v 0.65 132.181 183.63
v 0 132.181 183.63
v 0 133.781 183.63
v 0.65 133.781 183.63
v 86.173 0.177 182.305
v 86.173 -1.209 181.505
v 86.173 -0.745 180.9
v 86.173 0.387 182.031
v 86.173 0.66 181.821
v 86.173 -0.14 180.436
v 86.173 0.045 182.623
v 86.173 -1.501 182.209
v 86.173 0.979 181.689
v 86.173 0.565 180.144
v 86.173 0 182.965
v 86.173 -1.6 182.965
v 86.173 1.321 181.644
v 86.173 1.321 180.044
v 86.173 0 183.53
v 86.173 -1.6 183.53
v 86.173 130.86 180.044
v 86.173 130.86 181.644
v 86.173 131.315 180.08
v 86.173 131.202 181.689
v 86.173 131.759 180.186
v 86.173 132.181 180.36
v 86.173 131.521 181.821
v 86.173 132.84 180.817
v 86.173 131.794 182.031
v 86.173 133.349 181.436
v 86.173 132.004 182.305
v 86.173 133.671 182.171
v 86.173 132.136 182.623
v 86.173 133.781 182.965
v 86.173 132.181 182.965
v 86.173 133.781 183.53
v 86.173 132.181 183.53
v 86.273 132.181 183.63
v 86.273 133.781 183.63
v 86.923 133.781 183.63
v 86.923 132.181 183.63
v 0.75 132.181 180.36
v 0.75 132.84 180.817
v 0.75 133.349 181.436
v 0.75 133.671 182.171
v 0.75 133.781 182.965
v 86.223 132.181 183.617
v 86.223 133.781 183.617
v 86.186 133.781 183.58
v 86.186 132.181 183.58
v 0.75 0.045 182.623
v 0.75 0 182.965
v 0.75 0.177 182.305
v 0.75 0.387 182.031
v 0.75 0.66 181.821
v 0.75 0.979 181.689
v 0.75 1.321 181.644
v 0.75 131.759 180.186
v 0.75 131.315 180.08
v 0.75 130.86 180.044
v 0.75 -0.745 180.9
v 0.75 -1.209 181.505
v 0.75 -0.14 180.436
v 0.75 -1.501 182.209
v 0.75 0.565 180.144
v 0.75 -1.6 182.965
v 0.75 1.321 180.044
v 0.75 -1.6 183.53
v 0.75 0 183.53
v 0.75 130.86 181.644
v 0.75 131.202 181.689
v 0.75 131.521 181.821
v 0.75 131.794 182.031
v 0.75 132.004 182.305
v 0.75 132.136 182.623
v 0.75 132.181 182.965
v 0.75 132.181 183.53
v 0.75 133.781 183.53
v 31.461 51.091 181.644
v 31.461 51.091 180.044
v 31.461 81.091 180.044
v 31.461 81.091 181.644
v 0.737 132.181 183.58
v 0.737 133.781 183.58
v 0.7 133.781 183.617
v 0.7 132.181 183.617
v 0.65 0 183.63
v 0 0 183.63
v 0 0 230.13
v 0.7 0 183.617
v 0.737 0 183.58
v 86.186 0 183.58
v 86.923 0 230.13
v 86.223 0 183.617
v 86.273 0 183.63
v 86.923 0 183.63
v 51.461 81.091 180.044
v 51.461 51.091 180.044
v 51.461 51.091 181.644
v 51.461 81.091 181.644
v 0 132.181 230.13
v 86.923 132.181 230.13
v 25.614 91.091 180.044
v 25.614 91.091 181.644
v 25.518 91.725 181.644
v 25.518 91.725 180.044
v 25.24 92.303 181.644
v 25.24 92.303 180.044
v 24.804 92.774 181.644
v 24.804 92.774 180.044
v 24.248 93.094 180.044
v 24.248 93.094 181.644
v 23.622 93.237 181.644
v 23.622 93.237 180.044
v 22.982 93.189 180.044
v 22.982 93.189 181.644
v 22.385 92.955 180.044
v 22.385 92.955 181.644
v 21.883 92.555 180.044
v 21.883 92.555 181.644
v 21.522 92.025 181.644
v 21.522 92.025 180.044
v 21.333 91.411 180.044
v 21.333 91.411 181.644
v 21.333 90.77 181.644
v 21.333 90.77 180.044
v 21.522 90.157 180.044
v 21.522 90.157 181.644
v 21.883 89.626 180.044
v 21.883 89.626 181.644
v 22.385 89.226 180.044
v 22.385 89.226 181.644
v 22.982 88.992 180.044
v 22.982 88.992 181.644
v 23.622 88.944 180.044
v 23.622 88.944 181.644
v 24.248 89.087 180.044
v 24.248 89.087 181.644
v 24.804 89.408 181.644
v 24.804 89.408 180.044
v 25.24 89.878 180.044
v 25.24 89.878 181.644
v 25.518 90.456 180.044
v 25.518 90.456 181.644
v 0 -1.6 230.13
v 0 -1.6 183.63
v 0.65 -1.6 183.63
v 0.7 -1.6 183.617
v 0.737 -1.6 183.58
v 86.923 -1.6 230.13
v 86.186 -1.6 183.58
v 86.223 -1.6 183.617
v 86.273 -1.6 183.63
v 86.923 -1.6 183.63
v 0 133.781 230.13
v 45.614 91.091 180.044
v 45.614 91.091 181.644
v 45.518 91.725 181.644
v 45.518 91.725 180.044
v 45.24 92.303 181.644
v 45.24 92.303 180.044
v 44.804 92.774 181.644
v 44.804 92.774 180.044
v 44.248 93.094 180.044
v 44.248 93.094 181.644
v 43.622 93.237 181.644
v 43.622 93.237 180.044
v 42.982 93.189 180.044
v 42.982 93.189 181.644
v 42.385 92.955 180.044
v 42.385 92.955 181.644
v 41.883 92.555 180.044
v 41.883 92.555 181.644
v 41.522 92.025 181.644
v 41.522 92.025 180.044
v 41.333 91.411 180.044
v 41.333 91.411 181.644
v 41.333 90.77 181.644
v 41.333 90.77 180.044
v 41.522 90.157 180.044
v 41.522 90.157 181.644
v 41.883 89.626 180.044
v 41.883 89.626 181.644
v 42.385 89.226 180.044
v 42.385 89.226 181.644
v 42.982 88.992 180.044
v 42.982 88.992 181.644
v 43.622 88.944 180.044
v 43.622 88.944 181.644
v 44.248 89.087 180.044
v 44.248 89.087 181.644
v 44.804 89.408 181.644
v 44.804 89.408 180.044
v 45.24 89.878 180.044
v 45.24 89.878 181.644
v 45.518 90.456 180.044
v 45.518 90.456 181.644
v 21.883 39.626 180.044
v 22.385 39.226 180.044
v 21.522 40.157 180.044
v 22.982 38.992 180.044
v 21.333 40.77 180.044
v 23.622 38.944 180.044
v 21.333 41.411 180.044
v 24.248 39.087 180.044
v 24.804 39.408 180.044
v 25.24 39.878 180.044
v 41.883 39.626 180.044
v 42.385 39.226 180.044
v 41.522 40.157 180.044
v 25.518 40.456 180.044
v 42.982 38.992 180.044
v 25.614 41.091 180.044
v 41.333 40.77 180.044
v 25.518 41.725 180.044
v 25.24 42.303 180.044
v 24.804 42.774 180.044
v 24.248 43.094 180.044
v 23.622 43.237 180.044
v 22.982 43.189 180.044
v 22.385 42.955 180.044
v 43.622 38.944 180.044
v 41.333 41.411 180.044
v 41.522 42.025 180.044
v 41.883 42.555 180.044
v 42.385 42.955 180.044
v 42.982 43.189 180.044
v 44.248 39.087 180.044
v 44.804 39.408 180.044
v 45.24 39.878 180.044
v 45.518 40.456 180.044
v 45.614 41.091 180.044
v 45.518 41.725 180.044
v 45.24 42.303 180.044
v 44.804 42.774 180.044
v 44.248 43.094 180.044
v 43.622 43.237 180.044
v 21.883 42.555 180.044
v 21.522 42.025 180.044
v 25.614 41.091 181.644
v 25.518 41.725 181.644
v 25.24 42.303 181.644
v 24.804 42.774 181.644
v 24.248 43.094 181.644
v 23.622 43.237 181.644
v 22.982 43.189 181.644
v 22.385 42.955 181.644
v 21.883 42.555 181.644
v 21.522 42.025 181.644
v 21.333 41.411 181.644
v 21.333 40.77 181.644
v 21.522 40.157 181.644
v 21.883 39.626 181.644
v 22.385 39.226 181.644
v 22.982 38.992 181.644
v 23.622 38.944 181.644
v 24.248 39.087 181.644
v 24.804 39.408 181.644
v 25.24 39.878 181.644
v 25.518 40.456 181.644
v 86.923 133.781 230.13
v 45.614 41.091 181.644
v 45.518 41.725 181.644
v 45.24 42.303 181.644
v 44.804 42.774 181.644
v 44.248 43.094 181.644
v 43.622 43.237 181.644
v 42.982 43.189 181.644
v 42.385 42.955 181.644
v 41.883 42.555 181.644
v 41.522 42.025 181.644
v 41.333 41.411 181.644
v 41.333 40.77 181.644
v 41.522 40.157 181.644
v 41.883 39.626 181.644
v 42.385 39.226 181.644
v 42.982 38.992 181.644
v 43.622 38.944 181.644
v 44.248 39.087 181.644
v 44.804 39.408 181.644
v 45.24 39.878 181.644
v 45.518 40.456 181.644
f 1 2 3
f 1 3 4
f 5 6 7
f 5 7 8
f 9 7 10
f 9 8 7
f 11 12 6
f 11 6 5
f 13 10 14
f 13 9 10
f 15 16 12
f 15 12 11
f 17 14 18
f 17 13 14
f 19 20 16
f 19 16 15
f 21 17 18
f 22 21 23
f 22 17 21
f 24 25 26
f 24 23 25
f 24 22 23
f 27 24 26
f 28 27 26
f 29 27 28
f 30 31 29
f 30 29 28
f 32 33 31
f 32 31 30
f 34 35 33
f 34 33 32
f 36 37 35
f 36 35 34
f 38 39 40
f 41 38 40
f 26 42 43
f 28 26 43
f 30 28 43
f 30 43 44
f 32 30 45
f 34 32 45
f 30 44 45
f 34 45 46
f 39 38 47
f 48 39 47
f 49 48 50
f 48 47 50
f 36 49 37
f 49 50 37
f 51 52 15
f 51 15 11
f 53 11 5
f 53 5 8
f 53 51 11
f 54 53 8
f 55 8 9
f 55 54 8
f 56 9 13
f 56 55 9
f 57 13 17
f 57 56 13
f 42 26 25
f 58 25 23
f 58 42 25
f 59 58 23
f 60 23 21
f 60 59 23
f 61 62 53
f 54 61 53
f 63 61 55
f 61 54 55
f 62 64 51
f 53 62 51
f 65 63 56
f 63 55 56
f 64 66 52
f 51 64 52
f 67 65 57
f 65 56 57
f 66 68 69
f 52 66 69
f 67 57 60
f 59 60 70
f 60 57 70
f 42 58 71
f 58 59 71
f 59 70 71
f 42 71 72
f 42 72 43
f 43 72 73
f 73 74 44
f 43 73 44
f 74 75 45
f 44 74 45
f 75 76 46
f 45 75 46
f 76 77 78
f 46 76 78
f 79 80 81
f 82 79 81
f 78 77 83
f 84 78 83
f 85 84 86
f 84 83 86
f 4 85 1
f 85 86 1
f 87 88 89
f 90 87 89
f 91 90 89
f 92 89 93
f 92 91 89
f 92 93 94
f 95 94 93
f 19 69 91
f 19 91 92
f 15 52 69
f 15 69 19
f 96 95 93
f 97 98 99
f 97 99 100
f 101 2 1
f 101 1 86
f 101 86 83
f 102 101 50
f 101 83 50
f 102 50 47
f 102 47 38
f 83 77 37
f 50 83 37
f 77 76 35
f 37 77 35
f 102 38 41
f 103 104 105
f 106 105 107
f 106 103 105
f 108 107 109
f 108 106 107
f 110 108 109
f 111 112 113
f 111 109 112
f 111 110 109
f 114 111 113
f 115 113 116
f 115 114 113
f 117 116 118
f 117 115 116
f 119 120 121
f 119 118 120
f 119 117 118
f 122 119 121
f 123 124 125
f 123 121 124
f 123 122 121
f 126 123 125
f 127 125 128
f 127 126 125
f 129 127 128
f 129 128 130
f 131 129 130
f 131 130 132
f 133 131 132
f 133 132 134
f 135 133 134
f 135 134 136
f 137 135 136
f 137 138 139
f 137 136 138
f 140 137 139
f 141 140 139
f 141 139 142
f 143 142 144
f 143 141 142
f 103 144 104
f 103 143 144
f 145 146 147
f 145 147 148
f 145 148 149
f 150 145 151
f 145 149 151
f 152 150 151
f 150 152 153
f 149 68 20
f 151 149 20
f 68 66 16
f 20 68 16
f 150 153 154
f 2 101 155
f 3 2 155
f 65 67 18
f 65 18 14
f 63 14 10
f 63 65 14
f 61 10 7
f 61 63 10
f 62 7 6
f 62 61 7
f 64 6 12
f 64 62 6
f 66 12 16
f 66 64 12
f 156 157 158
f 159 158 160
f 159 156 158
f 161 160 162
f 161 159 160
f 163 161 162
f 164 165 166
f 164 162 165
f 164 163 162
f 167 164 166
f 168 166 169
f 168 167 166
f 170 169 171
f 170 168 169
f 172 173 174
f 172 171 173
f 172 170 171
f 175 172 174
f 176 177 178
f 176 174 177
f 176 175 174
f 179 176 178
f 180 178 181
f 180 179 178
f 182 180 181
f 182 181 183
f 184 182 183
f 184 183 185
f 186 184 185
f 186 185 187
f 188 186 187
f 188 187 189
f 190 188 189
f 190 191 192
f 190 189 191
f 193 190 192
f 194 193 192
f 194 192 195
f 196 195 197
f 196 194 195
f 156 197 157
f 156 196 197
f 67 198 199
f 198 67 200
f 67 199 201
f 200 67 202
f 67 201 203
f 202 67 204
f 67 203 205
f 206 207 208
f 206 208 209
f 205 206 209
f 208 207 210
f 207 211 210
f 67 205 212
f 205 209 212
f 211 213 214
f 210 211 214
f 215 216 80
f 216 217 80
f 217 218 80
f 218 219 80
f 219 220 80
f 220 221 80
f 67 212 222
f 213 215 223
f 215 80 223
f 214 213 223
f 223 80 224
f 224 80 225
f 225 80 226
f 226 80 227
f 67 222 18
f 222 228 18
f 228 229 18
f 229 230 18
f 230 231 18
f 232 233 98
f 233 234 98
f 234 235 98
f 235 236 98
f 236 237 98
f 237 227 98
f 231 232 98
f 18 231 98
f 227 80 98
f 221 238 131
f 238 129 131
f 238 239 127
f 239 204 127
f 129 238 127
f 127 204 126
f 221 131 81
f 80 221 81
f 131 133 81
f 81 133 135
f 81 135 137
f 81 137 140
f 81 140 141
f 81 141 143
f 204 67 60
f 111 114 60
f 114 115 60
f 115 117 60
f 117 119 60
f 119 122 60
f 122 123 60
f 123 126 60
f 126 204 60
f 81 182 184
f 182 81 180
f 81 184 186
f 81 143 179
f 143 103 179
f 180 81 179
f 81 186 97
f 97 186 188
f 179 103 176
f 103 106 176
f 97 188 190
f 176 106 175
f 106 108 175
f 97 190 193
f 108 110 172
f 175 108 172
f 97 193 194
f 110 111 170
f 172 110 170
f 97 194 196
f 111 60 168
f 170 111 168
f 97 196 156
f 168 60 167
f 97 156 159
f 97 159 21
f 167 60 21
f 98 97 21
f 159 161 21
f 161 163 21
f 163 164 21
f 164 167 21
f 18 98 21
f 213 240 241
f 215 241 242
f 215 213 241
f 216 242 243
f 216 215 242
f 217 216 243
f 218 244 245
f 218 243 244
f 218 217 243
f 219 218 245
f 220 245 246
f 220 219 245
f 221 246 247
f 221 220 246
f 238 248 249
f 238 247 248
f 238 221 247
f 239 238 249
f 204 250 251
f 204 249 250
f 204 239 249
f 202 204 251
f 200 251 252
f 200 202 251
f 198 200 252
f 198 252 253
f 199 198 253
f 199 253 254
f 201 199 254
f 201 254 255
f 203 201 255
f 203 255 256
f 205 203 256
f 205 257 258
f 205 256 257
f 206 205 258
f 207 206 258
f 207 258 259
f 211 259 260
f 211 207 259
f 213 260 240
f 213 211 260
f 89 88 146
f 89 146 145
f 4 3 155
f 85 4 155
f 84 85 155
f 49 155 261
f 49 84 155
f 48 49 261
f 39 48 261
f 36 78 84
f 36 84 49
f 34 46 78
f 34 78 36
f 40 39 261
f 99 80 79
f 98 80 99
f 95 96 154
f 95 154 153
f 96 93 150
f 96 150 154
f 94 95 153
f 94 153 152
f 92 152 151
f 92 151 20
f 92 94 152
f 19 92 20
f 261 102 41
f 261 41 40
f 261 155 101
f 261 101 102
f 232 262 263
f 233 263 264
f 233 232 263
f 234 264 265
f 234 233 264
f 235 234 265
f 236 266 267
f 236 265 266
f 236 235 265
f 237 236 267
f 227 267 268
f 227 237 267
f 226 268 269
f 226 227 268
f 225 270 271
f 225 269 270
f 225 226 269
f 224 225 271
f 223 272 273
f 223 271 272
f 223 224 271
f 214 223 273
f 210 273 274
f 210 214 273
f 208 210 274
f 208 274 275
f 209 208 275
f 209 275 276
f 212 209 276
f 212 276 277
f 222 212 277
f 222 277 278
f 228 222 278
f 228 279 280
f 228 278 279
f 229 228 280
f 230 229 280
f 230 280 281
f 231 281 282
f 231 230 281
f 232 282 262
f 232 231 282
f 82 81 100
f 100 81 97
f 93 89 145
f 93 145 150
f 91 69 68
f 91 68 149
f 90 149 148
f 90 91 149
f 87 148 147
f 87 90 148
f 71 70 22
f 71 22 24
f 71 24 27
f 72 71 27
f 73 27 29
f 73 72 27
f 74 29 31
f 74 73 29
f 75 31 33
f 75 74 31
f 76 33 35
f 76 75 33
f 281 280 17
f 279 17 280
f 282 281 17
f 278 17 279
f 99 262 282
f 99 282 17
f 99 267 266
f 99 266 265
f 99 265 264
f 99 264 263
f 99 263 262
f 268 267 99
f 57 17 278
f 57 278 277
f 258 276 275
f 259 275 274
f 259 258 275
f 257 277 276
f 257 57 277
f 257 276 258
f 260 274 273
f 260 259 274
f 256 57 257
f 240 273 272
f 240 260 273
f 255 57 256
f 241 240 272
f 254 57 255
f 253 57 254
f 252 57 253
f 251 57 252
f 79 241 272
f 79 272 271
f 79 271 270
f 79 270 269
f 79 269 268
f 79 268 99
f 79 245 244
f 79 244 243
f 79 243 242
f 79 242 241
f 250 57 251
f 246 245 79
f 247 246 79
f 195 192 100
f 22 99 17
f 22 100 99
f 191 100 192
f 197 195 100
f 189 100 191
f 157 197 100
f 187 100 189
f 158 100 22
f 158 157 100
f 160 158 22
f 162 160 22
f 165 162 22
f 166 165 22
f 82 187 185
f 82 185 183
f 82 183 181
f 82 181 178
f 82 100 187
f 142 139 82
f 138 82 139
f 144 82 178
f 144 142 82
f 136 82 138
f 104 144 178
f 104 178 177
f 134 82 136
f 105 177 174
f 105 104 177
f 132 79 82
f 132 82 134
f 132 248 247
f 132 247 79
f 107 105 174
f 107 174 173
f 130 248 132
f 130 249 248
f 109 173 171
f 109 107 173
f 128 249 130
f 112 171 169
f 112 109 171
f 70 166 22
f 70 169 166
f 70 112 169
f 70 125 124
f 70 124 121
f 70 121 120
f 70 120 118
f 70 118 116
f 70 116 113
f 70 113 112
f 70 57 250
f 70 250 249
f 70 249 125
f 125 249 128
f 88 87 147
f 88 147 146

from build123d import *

# Parameters (mm, degrees)
SKETCH1_R                    = 2.15265
SKETCH1_W                    = 20
SKETCH1_H                    = 30
BASE_FLANGE1_DEPTH           = 1.6002
SKETCHED_BEND1_OUTLINE_W     = 86.92285
SKETCHED_BEND1_OUTLINE_H     = 1.6002
SKETCHED_BEND1_DEPTH         = 180.344310973
SKETCHED_START               = 183.63
SKETCHED_BEND1_2_OUTLINE_W   = 86.92285
SKETCHED_BEND1_2_OUTLINE_H   = 1.6002
SKETCHED_BEND1_2_DEPTH       = 46.5
SKETCHED_START_2             = 181.496703893
SKETCHED_BEND1_3_OUTLINE_W   = 85.42285
SKETCHED_BEND1_3_OUTLINE_H   = 132.181185133
SKETCHED_BEND1_3_OUTLINE_R   = 2.15265
SKETCHED_BEND1_3_OUTLINE_W_2 = 20
SKETCHED_BEND1_3_OUTLINE_H_2 = 30
SKETCHED_BEND1_3_DEPTH       = 0.14770354
SKETCHED_START_3             = 182.965207433
SKETCHED_BEND1_4_OUTLINE_W   = 85.42285
SKETCHED_BEND1_4_OUTLINE_H   = 1.6002
SKETCHED_BEND1_4_DEPTH       = 0.664792567
SKETCHED_START_4             = 180.044207433
SKETCHED_BEND1_5_OUTLINE_W   = 85.42285
SKETCHED_BEND1_5_OUTLINE_H   = 132.181185133
SKETCHED_BEND1_5_OUTLINE_R   = 2.15265
SKETCHED_BEND1_5_OUTLINE_W_2 = 20
SKETCHED_BEND1_5_OUTLINE_H_2 = 30
SKETCHED_BEND1_5_DEPTH       = 2.921
SKETCHED_START_5             = 0.75
SKETCHED_BEND1_6_DEPTH       = 85.42285
SKETCHED_START_6             = 132.181185133
SKETCHED_BEND1_7_DEPTH       = 1.6002
SKETCHED_BEND1_8_DEPTH       = 85.42285


with BuildPart() as part:
    # Base-Flange1: sheet metal written as solids
    # Sketch1 → Base-Flange1 (new body)
    with BuildSketch(Plane(origin=(0, 0, 0), x_dir=(1, 0, 0), z_dir=(0, 1, 0))):
        with BuildLine():
            Line((0.75, -46.6), (0.75, -183.53))
            ThreePointArc((0.75, -183.53), (0.720710678, -183.600710678), (0.65, -183.63))
            Line((0.65, -183.63), (0, -183.63))
            Line((0, -183.63), (0, -230.13))
            Line((0, -230.13), (86.92285, -230.13))
            Line((86.92285, -230.13), (86.92285, -183.63))
            Line((86.92285, -183.63), (86.27285, -183.63))
            ThreePointArc((86.27285, -183.63), (86.202139322, -183.600710678), (86.17285, -183.53))
            Line((86.17285, -183.53), (86.17285, -46.6))
            ThreePointArc((86.17285, -46.6), (86.202139322, -46.529289322), (86.27285, -46.5))
            Line((86.27285, -46.5), (86.92285, -46.5))
            Line((86.92285, -46.5), (86.92285, 0))
            Line((86.92285, 0), (0, 0))
            Line((0, 0), (0, -46.5))
            Line((0, -46.5), (0.65, -46.5))
            ThreePointArc((0.65, -46.5), (0.720710678, -46.529289322), (0.75, -46.6))
        make_face()
        with Locations(Location((43.461425, -90.065, 0), (0, 0, 270))):
            Circle(SKETCH1_R, mode=Mode.SUBTRACT)
        with Locations(Location((43.461425, -140.065, 0), (0, 0, 270))):
            Circle(SKETCH1_R, mode=Mode.SUBTRACT)
        with Locations(Location((23.461425, -90.065, 0), (0, 0, 270))):
            Circle(SKETCH1_R, mode=Mode.SUBTRACT)
        with Locations(Location((23.461425, -140.065, 0), (0, 0, 270))):
            Circle(SKETCH1_R, mode=Mode.SUBTRACT)
        with Locations((41.461425, -115.065)):
            Rectangle(SKETCH1_W, SKETCH1_H, mode=Mode.SUBTRACT)
    extrude(amount=-BASE_FLANGE1_DEPTH)

    # Sketched Bend1: read off the stored shape, not the designer's step
    # Sketched Bend1 outline → Sketched Bend1 (cut)
    with BuildSketch(Plane.XY):
        with Locations((43.461425, -0.8001)):
            Rectangle(SKETCHED_BEND1_OUTLINE_W, SKETCHED_BEND1_OUTLINE_H)
    extrude(amount=SKETCHED_BEND1_DEPTH, mode=Mode.SUBTRACT)

    # Sketched Bend1 3 outline → Sketched Bend1 3 (add)
    with BuildSketch(Plane.XY.offset(SKETCHED_START_2)):
        with Locations((43.461425, 66.090592567)):
            Rectangle(SKETCHED_BEND1_3_OUTLINE_W, SKETCHED_BEND1_3_OUTLINE_H)
        with Locations((23.461425, 41.090592567)):
            Circle(SKETCHED_BEND1_3_OUTLINE_R, mode=Mode.SUBTRACT)
        with Locations((43.461425, 41.090592567)):
            Circle(SKETCHED_BEND1_3_OUTLINE_R, mode=Mode.SUBTRACT)
        with Locations((41.461425, 66.090592567)):
            Rectangle(SKETCHED_BEND1_3_OUTLINE_W_2, SKETCHED_BEND1_3_OUTLINE_H_2, mode=Mode.SUBTRACT)
        with Locations((23.461425, 91.090592567)):
            Circle(SKETCHED_BEND1_3_OUTLINE_R, mode=Mode.SUBTRACT)
        with Locations((43.461425, 91.090592567)):
            Circle(SKETCHED_BEND1_3_OUTLINE_R, mode=Mode.SUBTRACT)
    extrude(amount=SKETCHED_BEND1_3_DEPTH)



with BuildPart() as body_2:
    # Sketched Bend1 2 outline → Sketched Bend1 2 (new body)
    with BuildSketch(Plane.XY.offset(SKETCHED_START)):
        with Locations((43.461425, 132.981285133)):
            Rectangle(SKETCHED_BEND1_2_OUTLINE_W, SKETCHED_BEND1_2_OUTLINE_H)
    extrude(amount=SKETCHED_BEND1_2_DEPTH)

    # Sketched Bend1 4 outline → Sketched Bend1 4 (add)
    with BuildSketch(Plane.XY.offset(SKETCHED_START_3)):
        with Locations((43.461425, 132.981285133)):
            Rectangle(SKETCHED_BEND1_4_OUTLINE_W, SKETCHED_BEND1_4_OUTLINE_H)
    extrude(amount=SKETCHED_BEND1_4_DEPTH)


with BuildPart() as part_1:
    add(part.part)

    add(body_2.part)  # Sketched Bend1 5 merges body 2
    # Sketched Bend1 5 outline → Sketched Bend1 5 (add)
    with BuildSketch(Plane.XY.offset(SKETCHED_START_4)):
        with Locations((43.461425, 66.090592567)):
            Rectangle(SKETCHED_BEND1_5_OUTLINE_W, SKETCHED_BEND1_5_OUTLINE_H)
        with Locations((23.461425, 41.090592567)):
            Circle(SKETCHED_BEND1_5_OUTLINE_R, mode=Mode.SUBTRACT)
        with Locations((43.461425, 41.090592567)):
            Circle(SKETCHED_BEND1_5_OUTLINE_R, mode=Mode.SUBTRACT)
        with Locations((41.461425, 66.090592567)):
            Rectangle(SKETCHED_BEND1_5_OUTLINE_W_2, SKETCHED_BEND1_5_OUTLINE_H_2, mode=Mode.SUBTRACT)
        with Locations((23.461425, 91.090592567)):
            Circle(SKETCHED_BEND1_5_OUTLINE_R, mode=Mode.SUBTRACT)
        with Locations((43.461425, 91.090592567)):
            Circle(SKETCHED_BEND1_5_OUTLINE_R, mode=Mode.SUBTRACT)
    extrude(amount=SKETCHED_BEND1_5_DEPTH)

    # Sketched Bend1 6 outline → Sketched Bend1 6 (add)
    with BuildSketch(Plane.YZ.offset(SKETCHED_START_5)):
        with BuildLine():
            Line((133.781385133, 182.965207433), (132.181185133, 182.965207433))
            Line((132.181185133, 182.965207433), (132.181185133, 180.359880513))
            ThreePointArc((132.181185133, 180.359880513), (133.349390737, 181.436452352), (133.781385133, 182.965207433))
        make_face()
    extrude(amount=SKETCHED_BEND1_6_DEPTH)

    # Sketched Bend1 7 outline → Sketched Bend1 7 (add)
    with BuildSketch(Plane(origin=(0, 0, 0), x_dir=(1, 0, 0), z_dir=(0, 1, 0)).offset(SKETCHED_START_6)):
        with BuildLine():
            Line((0.75, -183.63), (0.75, -183.53))
            ThreePointArc((0.75, -183.53), (0.720710678, -183.600710678), (0.65, -183.63))
            Line((0.65, -183.63), (0.75, -183.63))
        make_face()
        with BuildLine():
            ThreePointArc((86.27285, -183.63), (86.202139322, -183.600710678), (86.17285, -183.53))
            Line((86.17285, -183.53), (86.17285, -183.63))
            Line((86.17285, -183.63), (86.27285, -183.63))
        make_face()
    extrude(amount=SKETCHED_BEND1_7_DEPTH)

    # Sketched Bend1 8 outline → Sketched Bend1 8 (cut)
    with BuildSketch(Plane.YZ.offset(SKETCHED_START_5)):
        with BuildLine():
            ThreePointArc((130.860385133, 181.644407433), (131.79433177, 182.031260796), (132.181185133, 182.965207433))
            Line((132.181185133, 182.965207433), (0, 182.965207433))
            ThreePointArc((0, 182.965207433), (0.386853363, 182.031260796), (1.3208, 181.644407433))
            Line((1.3208, 181.644407433), (130.860385133, 181.644407433))
        make_face()
        with BuildLine():
            Line((132.181185133, 180.044207433), (132.181185133, 180.359880513))
            ThreePointArc((132.181185133, 180.359880513), (131.539384789, 180.124221607), (130.860385133, 180.044207433))
            Line((130.860385133, 180.044207433), (132.181185133, 180.044207433))
        make_face()
        with BuildLine():
            Line((0, 180.04420738), (1.3208, 180.044207433))
            ThreePointArc((1.3208, 180.044207433), (-0.744658907, 180.899748526), (-1.6002, 182.965207433))
            Line((-1.6002, 182.965207433), (-1.600200001, 185))
            Line((-1.600200001, 185), (-3, 185))
            Line((-3, 185), (-3, 180.344310973))
            Line((-3, 180.344310973), (0, 180.344310973))
            Line((0, 180.344310973), (0, 180.04420738))
        make_face()
    extrude(amount=SKETCHED_BEND1_8_DEPTH, mode=Mode.SUBTRACT)


solid = part_1.part
